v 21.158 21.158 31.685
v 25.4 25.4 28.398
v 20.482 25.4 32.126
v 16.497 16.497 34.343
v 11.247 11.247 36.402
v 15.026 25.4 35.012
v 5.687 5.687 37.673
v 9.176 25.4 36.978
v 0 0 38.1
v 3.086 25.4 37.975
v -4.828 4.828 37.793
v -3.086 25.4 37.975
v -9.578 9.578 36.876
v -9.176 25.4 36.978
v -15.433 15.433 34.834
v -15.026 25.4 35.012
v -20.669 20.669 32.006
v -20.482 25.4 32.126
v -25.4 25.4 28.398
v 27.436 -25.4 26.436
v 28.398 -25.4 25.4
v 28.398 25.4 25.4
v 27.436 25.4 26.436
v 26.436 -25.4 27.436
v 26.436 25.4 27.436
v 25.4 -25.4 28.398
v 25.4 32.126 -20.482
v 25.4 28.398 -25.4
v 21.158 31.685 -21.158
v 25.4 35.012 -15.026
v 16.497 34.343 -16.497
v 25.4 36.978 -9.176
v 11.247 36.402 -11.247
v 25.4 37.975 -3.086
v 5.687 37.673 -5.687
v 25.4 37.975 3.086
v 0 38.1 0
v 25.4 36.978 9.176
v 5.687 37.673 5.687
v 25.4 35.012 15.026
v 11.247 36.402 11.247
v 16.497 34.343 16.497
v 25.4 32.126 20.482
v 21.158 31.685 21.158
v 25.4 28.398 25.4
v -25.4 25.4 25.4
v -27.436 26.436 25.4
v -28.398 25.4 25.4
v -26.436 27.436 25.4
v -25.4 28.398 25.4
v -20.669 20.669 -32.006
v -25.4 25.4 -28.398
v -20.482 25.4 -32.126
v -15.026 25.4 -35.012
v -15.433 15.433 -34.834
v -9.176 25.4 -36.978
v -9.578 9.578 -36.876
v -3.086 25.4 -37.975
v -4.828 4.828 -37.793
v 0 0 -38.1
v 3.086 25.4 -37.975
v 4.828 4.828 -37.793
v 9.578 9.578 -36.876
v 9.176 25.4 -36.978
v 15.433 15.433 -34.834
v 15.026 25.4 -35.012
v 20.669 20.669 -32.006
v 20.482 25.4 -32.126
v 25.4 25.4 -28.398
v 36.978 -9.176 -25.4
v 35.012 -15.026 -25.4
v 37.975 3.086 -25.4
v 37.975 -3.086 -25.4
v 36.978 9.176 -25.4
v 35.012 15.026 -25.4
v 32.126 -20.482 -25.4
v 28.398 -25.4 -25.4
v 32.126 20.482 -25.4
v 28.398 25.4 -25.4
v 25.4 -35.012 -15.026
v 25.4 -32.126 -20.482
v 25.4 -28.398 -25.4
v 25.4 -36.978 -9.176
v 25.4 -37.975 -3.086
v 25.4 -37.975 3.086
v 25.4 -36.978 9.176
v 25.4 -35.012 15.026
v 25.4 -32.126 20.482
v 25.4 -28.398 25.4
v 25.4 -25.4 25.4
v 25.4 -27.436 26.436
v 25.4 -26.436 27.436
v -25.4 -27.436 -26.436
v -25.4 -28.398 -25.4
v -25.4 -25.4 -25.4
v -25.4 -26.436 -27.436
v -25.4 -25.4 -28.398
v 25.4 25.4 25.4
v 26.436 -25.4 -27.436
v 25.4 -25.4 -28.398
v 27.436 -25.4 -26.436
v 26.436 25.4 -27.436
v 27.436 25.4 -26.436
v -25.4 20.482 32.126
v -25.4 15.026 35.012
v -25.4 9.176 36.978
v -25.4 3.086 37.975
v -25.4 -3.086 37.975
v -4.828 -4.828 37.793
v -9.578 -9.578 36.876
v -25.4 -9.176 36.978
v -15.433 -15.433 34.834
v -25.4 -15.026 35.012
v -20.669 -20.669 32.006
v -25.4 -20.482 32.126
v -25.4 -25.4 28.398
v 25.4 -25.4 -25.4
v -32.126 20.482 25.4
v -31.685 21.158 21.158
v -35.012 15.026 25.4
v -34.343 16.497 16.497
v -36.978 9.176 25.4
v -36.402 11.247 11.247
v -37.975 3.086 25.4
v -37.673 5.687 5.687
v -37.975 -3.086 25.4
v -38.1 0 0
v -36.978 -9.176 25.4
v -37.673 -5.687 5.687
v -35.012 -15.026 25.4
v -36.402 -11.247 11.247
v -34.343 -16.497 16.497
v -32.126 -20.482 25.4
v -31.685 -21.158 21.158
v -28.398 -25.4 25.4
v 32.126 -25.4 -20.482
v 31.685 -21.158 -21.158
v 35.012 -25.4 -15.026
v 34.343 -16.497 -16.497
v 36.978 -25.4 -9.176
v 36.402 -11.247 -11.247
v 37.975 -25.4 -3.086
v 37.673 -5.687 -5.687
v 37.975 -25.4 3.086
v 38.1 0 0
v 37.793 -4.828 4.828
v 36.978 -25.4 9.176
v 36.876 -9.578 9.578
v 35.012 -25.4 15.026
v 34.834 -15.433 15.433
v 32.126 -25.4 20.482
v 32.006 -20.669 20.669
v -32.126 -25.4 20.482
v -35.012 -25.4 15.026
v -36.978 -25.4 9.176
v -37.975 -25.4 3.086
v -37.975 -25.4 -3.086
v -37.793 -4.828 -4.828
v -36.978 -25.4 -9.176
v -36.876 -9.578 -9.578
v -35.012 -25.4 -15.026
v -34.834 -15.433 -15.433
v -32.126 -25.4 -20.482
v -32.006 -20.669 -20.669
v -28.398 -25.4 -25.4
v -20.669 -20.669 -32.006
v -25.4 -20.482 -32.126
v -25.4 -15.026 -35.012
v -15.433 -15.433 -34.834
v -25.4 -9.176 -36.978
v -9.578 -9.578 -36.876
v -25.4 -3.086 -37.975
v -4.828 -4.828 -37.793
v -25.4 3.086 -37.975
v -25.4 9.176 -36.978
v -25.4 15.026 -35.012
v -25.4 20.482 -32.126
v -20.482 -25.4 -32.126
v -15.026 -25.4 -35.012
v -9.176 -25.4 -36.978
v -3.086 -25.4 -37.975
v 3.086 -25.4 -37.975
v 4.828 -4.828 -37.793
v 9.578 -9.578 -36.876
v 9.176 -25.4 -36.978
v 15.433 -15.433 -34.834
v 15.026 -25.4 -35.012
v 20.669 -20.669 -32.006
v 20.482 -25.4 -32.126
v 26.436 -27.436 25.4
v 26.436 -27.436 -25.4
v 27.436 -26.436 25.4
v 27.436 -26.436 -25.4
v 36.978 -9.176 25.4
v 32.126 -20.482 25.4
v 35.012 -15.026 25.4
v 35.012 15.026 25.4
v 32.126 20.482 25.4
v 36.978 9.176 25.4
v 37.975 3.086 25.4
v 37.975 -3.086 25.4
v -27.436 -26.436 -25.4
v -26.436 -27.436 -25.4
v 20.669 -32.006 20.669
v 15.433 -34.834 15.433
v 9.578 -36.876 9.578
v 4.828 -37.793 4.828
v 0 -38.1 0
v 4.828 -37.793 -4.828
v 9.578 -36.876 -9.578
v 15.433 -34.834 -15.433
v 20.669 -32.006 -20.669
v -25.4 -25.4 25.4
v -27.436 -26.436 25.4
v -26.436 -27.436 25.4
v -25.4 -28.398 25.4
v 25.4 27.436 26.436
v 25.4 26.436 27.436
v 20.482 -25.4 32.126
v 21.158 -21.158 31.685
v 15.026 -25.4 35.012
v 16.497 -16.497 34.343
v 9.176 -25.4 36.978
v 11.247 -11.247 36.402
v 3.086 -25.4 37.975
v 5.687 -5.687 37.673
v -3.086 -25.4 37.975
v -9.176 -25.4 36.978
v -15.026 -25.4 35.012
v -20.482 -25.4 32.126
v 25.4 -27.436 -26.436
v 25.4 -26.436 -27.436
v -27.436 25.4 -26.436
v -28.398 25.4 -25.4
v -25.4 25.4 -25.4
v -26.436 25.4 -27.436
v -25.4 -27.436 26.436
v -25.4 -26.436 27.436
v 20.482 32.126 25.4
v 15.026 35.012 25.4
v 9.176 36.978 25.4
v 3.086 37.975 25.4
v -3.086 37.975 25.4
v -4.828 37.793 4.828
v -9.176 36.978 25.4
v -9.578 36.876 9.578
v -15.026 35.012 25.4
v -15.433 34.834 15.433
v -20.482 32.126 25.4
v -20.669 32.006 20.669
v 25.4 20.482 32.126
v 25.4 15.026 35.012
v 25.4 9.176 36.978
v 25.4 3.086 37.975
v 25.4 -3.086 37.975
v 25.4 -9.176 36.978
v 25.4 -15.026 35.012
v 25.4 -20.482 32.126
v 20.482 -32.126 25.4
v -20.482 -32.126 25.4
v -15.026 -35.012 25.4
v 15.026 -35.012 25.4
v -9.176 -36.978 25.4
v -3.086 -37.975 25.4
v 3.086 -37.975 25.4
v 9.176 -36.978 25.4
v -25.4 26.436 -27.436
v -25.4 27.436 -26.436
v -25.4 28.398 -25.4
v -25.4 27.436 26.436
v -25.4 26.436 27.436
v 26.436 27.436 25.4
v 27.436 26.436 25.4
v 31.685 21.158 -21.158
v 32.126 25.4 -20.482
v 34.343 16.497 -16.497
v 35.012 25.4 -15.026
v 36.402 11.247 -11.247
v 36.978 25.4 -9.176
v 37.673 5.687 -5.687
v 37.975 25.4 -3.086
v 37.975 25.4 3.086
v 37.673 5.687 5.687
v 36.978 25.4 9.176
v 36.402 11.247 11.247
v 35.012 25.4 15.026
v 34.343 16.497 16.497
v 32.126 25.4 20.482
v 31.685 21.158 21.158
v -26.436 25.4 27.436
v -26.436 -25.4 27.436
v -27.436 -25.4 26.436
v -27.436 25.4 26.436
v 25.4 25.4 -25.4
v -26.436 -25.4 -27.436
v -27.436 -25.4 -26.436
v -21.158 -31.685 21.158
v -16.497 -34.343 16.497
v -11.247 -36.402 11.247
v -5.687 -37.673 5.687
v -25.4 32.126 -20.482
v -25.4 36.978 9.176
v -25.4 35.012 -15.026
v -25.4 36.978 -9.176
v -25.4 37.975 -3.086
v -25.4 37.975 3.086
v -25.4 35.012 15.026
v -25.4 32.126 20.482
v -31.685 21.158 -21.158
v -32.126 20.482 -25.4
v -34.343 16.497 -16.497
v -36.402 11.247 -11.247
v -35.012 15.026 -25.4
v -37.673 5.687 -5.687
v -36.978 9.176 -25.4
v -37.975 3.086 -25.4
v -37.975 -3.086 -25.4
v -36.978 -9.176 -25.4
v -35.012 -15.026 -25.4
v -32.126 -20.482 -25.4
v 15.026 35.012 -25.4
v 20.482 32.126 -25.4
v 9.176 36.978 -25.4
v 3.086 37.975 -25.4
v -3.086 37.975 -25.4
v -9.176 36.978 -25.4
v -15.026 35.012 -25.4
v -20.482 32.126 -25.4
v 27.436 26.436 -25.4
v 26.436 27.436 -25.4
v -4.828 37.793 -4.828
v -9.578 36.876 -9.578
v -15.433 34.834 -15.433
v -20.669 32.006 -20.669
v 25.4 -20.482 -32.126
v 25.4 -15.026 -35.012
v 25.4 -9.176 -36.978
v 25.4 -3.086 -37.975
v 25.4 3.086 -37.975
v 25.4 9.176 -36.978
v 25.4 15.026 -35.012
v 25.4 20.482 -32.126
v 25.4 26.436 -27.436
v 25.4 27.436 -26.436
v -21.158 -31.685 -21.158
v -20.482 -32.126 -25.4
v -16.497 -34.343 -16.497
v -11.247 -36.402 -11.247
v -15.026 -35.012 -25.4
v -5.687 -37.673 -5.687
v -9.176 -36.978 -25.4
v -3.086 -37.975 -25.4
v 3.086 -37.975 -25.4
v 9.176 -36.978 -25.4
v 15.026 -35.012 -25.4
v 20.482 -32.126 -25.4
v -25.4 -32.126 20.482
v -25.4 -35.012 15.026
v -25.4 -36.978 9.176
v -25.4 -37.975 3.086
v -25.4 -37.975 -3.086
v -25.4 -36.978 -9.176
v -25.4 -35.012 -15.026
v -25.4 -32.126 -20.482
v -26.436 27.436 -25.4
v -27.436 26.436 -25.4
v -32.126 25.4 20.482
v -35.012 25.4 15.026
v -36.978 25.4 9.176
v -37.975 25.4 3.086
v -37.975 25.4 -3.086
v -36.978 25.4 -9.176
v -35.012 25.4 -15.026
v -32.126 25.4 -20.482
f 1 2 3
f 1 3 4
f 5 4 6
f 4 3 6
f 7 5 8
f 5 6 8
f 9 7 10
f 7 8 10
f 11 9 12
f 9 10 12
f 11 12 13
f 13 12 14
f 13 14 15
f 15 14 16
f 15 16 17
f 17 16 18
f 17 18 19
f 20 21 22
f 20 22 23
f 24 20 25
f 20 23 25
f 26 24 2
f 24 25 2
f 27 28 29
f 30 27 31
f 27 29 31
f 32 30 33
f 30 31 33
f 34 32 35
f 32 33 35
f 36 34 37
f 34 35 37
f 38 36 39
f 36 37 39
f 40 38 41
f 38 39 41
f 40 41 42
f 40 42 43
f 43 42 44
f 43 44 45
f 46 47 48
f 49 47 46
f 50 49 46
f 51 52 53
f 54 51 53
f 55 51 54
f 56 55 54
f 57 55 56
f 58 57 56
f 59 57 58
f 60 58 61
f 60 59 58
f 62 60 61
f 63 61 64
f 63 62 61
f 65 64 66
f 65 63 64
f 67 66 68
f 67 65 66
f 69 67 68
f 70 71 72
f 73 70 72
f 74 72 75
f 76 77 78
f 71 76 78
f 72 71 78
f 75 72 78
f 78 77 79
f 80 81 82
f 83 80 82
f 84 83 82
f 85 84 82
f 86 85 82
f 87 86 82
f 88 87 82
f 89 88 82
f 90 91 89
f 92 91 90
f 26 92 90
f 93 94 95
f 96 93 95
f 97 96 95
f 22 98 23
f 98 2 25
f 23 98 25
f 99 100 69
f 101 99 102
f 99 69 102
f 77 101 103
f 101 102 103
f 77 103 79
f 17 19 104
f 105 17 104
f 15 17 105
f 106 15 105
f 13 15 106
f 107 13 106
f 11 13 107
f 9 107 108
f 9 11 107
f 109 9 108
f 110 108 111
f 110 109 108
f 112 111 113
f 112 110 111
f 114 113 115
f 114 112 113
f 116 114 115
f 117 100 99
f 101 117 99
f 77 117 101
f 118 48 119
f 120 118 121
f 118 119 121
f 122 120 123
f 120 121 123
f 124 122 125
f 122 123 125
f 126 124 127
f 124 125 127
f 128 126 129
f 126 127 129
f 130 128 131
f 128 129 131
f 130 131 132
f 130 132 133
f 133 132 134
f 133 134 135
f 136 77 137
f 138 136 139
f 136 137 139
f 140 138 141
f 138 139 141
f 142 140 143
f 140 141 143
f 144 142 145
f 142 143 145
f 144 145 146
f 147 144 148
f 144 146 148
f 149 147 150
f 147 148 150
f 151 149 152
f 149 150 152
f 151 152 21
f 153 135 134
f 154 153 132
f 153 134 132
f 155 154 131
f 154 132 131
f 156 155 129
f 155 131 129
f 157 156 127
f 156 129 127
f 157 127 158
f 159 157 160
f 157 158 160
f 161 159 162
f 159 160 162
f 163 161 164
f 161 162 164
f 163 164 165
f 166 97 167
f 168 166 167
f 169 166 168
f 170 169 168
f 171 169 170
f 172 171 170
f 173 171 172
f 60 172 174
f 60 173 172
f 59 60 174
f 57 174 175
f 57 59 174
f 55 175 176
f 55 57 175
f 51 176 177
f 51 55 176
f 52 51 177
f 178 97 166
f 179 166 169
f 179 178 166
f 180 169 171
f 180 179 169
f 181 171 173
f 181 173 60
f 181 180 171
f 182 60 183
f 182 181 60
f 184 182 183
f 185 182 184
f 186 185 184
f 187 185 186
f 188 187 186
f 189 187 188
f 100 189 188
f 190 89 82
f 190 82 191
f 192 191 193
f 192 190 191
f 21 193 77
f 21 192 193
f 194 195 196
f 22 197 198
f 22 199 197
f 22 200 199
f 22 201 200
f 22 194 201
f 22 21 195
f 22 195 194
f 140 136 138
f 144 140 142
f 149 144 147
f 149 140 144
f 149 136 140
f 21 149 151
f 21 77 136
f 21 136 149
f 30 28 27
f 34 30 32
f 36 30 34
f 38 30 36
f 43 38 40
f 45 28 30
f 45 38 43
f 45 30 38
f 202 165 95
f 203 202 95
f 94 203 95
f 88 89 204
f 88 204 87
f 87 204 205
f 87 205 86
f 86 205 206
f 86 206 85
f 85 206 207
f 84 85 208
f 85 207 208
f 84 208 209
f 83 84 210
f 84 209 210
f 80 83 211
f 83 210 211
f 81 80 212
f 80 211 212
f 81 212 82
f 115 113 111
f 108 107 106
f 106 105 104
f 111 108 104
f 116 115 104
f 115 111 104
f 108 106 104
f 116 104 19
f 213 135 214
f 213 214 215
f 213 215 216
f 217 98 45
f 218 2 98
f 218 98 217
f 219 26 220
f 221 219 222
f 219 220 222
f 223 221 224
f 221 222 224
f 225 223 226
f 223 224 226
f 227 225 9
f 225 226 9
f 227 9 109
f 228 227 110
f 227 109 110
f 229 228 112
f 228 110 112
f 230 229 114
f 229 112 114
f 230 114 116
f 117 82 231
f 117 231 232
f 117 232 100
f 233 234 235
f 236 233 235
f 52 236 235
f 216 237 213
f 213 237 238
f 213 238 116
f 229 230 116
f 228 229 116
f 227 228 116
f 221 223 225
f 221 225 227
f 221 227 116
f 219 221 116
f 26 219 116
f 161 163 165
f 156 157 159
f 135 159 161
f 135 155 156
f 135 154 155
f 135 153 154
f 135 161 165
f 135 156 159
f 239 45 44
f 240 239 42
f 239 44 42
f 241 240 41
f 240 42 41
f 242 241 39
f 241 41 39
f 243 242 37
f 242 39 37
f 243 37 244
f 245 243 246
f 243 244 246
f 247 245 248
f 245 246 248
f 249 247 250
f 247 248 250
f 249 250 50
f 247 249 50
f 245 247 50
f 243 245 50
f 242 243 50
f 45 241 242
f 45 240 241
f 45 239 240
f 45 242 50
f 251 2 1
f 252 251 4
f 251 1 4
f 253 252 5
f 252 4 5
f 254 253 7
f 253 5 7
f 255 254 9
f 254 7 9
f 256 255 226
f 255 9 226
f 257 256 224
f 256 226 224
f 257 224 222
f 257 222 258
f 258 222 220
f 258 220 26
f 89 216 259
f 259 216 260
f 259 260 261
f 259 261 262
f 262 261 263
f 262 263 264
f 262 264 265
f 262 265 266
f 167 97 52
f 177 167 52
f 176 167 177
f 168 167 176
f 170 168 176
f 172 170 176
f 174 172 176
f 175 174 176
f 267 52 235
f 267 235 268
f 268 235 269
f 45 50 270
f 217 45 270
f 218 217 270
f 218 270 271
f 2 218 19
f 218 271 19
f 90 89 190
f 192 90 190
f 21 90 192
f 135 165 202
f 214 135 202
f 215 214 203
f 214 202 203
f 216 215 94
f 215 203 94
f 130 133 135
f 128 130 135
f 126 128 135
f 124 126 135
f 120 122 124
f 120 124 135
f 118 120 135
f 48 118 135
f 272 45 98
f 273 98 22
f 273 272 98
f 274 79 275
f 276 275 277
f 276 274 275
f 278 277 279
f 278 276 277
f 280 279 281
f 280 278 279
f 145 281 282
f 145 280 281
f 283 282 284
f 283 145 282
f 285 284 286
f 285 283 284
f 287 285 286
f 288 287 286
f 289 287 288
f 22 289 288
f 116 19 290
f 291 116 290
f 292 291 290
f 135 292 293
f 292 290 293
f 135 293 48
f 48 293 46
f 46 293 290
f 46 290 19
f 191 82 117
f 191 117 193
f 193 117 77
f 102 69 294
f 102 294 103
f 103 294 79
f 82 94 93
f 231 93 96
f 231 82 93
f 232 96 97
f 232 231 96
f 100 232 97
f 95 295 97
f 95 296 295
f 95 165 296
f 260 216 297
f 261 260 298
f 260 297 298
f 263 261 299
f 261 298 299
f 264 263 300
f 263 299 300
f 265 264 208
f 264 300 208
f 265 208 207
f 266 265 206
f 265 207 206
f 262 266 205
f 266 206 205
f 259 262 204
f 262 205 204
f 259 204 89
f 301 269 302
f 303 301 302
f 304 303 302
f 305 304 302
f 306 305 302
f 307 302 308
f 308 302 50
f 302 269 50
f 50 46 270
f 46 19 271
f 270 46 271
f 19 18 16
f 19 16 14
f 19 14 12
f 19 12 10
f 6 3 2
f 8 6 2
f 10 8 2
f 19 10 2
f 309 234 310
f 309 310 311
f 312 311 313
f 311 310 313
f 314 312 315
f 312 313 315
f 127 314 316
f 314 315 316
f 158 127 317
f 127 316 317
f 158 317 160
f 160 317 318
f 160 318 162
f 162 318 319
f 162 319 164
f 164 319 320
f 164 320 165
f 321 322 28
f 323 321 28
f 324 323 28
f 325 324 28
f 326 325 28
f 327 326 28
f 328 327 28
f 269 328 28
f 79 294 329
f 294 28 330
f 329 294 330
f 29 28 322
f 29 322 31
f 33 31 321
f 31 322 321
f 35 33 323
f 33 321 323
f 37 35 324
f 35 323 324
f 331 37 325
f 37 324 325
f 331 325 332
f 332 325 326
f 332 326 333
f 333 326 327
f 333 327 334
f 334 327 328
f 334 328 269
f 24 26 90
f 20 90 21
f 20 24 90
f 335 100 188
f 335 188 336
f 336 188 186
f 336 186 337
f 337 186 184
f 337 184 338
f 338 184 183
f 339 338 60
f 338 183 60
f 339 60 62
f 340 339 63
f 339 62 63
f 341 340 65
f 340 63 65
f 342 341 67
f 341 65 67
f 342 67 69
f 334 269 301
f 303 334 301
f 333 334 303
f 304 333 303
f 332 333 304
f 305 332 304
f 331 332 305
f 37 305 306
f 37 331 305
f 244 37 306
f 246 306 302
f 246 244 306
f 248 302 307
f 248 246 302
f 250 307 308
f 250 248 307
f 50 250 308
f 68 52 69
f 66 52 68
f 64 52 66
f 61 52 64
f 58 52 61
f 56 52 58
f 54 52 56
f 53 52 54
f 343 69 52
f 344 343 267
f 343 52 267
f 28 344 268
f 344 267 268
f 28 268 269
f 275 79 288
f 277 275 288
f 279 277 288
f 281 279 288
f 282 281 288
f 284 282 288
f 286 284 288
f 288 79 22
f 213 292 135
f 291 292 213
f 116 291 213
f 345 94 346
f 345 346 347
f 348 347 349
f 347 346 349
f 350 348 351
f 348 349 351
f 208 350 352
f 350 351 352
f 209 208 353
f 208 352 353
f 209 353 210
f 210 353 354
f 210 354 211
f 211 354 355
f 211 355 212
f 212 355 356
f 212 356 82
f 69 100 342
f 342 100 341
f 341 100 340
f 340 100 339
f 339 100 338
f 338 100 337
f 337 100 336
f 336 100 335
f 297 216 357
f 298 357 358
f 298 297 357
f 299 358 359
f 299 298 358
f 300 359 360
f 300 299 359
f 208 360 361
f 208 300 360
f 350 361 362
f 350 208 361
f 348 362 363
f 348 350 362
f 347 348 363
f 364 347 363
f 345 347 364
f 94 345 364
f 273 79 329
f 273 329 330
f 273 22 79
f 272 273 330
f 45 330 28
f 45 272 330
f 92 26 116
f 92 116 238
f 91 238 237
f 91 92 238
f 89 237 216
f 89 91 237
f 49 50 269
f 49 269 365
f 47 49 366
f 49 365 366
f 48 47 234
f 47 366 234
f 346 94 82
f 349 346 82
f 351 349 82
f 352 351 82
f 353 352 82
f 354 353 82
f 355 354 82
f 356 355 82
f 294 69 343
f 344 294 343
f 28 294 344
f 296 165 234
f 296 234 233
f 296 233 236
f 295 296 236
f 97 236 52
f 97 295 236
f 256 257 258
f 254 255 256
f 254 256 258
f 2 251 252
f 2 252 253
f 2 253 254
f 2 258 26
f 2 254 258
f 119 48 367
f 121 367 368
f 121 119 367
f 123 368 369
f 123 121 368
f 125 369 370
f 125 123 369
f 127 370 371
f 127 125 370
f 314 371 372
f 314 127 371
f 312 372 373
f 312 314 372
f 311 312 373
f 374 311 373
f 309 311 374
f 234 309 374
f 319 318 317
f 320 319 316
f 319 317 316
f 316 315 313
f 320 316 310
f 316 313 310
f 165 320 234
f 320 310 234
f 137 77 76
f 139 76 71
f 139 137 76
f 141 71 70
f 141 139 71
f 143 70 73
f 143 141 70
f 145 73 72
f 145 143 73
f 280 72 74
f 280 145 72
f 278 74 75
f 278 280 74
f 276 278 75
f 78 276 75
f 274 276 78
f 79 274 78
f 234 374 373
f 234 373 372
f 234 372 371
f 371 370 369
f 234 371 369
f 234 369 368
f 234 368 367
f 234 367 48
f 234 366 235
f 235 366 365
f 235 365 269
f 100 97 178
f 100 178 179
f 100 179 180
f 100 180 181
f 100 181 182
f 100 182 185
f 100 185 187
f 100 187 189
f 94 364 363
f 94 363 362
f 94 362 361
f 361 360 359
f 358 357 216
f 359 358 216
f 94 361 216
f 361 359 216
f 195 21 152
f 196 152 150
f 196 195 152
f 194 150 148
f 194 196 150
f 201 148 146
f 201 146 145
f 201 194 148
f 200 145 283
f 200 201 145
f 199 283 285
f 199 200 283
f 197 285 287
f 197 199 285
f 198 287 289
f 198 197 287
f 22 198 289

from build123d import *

# Parameters (mm, degrees)
F0_R      = 38.1
F1_DEPTH  = 25.4
F2_R      = 38.1
F3_DEPTH  = 25.4
F4_R      = 38.1
F5_DEPTH  = 25.4
F6_R      = 38.1
F7_DEPTH  = 25.4
F8_R      = 38.1
F9_DEPTH  = 25.4
F10_R     = 38.1
F11_DEPTH = 25.4


with BuildPart() as f1:
    # F0 (on Front) → F1 (new body)
    with BuildSketch(Plane.XZ):
        Circle(F0_R)
    extrude(amount=F1_DEPTH)

    # F2 (on Top) → F3 (join)
    with BuildSketch(Plane.XY):
        Circle(F2_R)
    extrude(amount=F3_DEPTH)

    # F4 (on Right) → F5 (join)
    with BuildSketch(Plane.YZ):
        Circle(F4_R)
    extrude(amount=F5_DEPTH)

    # F6 (on Top) → F7 (join)
    with BuildSketch(Plane.XY):
        Circle(F6_R)
    extrude(amount=-F7_DEPTH)

    # F8 (on Front) → F9 (join)
    with BuildSketch(Plane.XZ):
        Circle(F8_R)
    extrude(amount=-F9_DEPTH)

    # F10 (on Right) → F11 (join)
    with BuildSketch(Plane.YZ):
        Circle(F10_R)
    extrude(amount=-F11_DEPTH)


solid = f1.part
